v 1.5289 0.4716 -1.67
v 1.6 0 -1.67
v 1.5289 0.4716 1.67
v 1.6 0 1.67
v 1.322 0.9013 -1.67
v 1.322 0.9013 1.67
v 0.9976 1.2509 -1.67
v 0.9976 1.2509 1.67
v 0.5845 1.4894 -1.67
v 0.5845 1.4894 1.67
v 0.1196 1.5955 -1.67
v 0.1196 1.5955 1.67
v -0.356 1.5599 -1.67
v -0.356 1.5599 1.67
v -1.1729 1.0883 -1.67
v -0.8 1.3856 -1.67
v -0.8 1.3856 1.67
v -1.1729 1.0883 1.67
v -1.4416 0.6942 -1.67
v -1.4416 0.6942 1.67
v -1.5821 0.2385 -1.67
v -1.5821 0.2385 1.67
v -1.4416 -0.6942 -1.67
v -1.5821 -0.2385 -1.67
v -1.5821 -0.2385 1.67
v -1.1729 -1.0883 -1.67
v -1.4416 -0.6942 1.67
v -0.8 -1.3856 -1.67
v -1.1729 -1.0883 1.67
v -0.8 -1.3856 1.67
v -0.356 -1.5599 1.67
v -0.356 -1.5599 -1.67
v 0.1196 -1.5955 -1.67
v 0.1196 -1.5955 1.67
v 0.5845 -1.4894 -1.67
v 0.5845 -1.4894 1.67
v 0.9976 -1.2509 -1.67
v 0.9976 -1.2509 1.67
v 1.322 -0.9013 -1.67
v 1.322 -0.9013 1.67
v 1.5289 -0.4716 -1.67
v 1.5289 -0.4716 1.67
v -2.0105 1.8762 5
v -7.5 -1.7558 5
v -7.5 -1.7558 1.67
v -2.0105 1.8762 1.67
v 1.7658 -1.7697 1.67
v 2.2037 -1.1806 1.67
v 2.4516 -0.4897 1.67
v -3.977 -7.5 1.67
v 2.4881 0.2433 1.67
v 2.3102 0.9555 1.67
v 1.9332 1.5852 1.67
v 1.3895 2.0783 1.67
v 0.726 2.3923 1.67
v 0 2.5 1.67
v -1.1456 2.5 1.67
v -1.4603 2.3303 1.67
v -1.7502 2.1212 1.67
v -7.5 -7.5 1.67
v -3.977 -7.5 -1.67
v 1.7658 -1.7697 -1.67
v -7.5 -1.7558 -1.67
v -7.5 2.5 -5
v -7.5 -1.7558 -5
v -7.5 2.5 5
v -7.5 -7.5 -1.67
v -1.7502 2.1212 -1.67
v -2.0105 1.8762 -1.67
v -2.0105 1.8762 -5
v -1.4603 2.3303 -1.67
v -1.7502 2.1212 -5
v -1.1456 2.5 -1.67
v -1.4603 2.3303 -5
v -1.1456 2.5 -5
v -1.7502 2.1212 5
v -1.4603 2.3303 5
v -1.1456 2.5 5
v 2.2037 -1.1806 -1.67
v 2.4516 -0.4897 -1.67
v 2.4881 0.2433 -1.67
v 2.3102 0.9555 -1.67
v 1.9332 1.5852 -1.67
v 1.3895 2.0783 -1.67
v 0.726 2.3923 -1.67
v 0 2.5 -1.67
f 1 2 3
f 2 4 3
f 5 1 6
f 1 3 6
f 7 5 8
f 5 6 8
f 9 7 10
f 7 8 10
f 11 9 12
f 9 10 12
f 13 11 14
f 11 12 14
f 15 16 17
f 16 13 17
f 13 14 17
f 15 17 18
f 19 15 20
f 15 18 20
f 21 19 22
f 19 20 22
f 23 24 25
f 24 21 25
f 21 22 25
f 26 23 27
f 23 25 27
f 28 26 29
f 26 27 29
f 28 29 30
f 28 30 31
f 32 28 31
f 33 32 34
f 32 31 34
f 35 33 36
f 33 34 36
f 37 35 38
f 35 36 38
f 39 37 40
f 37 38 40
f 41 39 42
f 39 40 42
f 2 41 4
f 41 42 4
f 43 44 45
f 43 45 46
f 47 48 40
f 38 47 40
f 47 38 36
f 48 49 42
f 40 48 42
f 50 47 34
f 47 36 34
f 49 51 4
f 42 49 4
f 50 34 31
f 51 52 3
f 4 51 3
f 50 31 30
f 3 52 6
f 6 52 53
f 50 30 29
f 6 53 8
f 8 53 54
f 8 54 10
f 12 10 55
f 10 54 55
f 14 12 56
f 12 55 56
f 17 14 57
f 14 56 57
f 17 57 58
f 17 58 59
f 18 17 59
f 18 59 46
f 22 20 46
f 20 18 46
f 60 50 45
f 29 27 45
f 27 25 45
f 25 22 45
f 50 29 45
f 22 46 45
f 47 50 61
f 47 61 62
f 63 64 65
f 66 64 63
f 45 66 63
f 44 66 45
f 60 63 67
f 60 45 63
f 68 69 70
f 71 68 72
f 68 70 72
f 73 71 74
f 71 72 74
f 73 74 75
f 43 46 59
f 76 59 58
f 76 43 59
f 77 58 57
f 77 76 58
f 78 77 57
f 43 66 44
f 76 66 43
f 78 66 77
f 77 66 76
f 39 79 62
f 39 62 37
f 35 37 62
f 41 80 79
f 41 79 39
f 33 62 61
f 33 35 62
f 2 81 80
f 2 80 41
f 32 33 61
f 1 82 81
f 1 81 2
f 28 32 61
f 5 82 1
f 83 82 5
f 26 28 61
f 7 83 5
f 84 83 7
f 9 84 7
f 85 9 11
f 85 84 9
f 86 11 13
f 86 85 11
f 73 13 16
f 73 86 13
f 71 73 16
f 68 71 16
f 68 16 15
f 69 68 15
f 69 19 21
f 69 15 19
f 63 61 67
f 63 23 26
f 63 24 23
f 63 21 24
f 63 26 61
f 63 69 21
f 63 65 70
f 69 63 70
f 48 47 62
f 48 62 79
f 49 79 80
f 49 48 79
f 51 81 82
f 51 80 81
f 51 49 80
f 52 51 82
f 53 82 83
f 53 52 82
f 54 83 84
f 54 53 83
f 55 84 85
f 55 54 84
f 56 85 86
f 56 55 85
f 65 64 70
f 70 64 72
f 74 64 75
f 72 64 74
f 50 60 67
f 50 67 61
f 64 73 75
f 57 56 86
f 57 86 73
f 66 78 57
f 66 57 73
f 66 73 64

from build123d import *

# Parameters (mm, degrees)
SKETCH1_R           = 1.6
BOSS_EXTRUDE1_DEPTH = 5
CUT_EXTRUDE2_DEPTH  = 3.33


with BuildPart() as part:
    # Sketch1 → Boss-Extrude1 (new body)
    with BuildSketch(Plane.XY):
        with BuildLine():
            Line((0, 2.5), (-7.5, 2.5))
            Line((-7.5, 2.5), (-7.5, -7.5))
            Line((-7.5, -7.5), (-3.976969112, -7.5))
            Line((-3.976969112, -7.5), (1.765839775, -1.769692032))
            ThreePointArc((1.765839775, -1.769692032), (2.310219695, 0.955450135), (0, 2.5))
        make_face()
        Circle(SKETCH1_R, mode=Mode.SUBTRACT)
    extrude(amount=BOSS_EXTRUDE1_DEPTH)

    # Sketch4 → Cut-Extrude2 (cut)
    with BuildSketch(Plane.XY.offset(5)):
        with BuildLine():
            Line((1.943040083, -1.946046052), (-3.82334364, -7.91054561))
            Line((-3.82334364, -7.91054561), (-8.510185697, -7.91054561))
            Line((-8.510185697, -7.91054561), (-8.510185697, -2.424183437))
            Line((-8.510185697, -2.424183437), (-2.010547232, 1.876219558))
            ThreePointArc((-2.010547232, 1.876219558), (1.911430852, 1.977101945), (1.943040083, -1.946046052))
        make_face()
    extrude(amount=-CUT_EXTRUDE2_DEPTH, mode=Mode.SUBTRACT)

    # Mirror1: part across plane


with BuildPart() as part_1:
    add(part.part)
    add(part.part.mirror(Plane.XY))


solid = part_1.part
